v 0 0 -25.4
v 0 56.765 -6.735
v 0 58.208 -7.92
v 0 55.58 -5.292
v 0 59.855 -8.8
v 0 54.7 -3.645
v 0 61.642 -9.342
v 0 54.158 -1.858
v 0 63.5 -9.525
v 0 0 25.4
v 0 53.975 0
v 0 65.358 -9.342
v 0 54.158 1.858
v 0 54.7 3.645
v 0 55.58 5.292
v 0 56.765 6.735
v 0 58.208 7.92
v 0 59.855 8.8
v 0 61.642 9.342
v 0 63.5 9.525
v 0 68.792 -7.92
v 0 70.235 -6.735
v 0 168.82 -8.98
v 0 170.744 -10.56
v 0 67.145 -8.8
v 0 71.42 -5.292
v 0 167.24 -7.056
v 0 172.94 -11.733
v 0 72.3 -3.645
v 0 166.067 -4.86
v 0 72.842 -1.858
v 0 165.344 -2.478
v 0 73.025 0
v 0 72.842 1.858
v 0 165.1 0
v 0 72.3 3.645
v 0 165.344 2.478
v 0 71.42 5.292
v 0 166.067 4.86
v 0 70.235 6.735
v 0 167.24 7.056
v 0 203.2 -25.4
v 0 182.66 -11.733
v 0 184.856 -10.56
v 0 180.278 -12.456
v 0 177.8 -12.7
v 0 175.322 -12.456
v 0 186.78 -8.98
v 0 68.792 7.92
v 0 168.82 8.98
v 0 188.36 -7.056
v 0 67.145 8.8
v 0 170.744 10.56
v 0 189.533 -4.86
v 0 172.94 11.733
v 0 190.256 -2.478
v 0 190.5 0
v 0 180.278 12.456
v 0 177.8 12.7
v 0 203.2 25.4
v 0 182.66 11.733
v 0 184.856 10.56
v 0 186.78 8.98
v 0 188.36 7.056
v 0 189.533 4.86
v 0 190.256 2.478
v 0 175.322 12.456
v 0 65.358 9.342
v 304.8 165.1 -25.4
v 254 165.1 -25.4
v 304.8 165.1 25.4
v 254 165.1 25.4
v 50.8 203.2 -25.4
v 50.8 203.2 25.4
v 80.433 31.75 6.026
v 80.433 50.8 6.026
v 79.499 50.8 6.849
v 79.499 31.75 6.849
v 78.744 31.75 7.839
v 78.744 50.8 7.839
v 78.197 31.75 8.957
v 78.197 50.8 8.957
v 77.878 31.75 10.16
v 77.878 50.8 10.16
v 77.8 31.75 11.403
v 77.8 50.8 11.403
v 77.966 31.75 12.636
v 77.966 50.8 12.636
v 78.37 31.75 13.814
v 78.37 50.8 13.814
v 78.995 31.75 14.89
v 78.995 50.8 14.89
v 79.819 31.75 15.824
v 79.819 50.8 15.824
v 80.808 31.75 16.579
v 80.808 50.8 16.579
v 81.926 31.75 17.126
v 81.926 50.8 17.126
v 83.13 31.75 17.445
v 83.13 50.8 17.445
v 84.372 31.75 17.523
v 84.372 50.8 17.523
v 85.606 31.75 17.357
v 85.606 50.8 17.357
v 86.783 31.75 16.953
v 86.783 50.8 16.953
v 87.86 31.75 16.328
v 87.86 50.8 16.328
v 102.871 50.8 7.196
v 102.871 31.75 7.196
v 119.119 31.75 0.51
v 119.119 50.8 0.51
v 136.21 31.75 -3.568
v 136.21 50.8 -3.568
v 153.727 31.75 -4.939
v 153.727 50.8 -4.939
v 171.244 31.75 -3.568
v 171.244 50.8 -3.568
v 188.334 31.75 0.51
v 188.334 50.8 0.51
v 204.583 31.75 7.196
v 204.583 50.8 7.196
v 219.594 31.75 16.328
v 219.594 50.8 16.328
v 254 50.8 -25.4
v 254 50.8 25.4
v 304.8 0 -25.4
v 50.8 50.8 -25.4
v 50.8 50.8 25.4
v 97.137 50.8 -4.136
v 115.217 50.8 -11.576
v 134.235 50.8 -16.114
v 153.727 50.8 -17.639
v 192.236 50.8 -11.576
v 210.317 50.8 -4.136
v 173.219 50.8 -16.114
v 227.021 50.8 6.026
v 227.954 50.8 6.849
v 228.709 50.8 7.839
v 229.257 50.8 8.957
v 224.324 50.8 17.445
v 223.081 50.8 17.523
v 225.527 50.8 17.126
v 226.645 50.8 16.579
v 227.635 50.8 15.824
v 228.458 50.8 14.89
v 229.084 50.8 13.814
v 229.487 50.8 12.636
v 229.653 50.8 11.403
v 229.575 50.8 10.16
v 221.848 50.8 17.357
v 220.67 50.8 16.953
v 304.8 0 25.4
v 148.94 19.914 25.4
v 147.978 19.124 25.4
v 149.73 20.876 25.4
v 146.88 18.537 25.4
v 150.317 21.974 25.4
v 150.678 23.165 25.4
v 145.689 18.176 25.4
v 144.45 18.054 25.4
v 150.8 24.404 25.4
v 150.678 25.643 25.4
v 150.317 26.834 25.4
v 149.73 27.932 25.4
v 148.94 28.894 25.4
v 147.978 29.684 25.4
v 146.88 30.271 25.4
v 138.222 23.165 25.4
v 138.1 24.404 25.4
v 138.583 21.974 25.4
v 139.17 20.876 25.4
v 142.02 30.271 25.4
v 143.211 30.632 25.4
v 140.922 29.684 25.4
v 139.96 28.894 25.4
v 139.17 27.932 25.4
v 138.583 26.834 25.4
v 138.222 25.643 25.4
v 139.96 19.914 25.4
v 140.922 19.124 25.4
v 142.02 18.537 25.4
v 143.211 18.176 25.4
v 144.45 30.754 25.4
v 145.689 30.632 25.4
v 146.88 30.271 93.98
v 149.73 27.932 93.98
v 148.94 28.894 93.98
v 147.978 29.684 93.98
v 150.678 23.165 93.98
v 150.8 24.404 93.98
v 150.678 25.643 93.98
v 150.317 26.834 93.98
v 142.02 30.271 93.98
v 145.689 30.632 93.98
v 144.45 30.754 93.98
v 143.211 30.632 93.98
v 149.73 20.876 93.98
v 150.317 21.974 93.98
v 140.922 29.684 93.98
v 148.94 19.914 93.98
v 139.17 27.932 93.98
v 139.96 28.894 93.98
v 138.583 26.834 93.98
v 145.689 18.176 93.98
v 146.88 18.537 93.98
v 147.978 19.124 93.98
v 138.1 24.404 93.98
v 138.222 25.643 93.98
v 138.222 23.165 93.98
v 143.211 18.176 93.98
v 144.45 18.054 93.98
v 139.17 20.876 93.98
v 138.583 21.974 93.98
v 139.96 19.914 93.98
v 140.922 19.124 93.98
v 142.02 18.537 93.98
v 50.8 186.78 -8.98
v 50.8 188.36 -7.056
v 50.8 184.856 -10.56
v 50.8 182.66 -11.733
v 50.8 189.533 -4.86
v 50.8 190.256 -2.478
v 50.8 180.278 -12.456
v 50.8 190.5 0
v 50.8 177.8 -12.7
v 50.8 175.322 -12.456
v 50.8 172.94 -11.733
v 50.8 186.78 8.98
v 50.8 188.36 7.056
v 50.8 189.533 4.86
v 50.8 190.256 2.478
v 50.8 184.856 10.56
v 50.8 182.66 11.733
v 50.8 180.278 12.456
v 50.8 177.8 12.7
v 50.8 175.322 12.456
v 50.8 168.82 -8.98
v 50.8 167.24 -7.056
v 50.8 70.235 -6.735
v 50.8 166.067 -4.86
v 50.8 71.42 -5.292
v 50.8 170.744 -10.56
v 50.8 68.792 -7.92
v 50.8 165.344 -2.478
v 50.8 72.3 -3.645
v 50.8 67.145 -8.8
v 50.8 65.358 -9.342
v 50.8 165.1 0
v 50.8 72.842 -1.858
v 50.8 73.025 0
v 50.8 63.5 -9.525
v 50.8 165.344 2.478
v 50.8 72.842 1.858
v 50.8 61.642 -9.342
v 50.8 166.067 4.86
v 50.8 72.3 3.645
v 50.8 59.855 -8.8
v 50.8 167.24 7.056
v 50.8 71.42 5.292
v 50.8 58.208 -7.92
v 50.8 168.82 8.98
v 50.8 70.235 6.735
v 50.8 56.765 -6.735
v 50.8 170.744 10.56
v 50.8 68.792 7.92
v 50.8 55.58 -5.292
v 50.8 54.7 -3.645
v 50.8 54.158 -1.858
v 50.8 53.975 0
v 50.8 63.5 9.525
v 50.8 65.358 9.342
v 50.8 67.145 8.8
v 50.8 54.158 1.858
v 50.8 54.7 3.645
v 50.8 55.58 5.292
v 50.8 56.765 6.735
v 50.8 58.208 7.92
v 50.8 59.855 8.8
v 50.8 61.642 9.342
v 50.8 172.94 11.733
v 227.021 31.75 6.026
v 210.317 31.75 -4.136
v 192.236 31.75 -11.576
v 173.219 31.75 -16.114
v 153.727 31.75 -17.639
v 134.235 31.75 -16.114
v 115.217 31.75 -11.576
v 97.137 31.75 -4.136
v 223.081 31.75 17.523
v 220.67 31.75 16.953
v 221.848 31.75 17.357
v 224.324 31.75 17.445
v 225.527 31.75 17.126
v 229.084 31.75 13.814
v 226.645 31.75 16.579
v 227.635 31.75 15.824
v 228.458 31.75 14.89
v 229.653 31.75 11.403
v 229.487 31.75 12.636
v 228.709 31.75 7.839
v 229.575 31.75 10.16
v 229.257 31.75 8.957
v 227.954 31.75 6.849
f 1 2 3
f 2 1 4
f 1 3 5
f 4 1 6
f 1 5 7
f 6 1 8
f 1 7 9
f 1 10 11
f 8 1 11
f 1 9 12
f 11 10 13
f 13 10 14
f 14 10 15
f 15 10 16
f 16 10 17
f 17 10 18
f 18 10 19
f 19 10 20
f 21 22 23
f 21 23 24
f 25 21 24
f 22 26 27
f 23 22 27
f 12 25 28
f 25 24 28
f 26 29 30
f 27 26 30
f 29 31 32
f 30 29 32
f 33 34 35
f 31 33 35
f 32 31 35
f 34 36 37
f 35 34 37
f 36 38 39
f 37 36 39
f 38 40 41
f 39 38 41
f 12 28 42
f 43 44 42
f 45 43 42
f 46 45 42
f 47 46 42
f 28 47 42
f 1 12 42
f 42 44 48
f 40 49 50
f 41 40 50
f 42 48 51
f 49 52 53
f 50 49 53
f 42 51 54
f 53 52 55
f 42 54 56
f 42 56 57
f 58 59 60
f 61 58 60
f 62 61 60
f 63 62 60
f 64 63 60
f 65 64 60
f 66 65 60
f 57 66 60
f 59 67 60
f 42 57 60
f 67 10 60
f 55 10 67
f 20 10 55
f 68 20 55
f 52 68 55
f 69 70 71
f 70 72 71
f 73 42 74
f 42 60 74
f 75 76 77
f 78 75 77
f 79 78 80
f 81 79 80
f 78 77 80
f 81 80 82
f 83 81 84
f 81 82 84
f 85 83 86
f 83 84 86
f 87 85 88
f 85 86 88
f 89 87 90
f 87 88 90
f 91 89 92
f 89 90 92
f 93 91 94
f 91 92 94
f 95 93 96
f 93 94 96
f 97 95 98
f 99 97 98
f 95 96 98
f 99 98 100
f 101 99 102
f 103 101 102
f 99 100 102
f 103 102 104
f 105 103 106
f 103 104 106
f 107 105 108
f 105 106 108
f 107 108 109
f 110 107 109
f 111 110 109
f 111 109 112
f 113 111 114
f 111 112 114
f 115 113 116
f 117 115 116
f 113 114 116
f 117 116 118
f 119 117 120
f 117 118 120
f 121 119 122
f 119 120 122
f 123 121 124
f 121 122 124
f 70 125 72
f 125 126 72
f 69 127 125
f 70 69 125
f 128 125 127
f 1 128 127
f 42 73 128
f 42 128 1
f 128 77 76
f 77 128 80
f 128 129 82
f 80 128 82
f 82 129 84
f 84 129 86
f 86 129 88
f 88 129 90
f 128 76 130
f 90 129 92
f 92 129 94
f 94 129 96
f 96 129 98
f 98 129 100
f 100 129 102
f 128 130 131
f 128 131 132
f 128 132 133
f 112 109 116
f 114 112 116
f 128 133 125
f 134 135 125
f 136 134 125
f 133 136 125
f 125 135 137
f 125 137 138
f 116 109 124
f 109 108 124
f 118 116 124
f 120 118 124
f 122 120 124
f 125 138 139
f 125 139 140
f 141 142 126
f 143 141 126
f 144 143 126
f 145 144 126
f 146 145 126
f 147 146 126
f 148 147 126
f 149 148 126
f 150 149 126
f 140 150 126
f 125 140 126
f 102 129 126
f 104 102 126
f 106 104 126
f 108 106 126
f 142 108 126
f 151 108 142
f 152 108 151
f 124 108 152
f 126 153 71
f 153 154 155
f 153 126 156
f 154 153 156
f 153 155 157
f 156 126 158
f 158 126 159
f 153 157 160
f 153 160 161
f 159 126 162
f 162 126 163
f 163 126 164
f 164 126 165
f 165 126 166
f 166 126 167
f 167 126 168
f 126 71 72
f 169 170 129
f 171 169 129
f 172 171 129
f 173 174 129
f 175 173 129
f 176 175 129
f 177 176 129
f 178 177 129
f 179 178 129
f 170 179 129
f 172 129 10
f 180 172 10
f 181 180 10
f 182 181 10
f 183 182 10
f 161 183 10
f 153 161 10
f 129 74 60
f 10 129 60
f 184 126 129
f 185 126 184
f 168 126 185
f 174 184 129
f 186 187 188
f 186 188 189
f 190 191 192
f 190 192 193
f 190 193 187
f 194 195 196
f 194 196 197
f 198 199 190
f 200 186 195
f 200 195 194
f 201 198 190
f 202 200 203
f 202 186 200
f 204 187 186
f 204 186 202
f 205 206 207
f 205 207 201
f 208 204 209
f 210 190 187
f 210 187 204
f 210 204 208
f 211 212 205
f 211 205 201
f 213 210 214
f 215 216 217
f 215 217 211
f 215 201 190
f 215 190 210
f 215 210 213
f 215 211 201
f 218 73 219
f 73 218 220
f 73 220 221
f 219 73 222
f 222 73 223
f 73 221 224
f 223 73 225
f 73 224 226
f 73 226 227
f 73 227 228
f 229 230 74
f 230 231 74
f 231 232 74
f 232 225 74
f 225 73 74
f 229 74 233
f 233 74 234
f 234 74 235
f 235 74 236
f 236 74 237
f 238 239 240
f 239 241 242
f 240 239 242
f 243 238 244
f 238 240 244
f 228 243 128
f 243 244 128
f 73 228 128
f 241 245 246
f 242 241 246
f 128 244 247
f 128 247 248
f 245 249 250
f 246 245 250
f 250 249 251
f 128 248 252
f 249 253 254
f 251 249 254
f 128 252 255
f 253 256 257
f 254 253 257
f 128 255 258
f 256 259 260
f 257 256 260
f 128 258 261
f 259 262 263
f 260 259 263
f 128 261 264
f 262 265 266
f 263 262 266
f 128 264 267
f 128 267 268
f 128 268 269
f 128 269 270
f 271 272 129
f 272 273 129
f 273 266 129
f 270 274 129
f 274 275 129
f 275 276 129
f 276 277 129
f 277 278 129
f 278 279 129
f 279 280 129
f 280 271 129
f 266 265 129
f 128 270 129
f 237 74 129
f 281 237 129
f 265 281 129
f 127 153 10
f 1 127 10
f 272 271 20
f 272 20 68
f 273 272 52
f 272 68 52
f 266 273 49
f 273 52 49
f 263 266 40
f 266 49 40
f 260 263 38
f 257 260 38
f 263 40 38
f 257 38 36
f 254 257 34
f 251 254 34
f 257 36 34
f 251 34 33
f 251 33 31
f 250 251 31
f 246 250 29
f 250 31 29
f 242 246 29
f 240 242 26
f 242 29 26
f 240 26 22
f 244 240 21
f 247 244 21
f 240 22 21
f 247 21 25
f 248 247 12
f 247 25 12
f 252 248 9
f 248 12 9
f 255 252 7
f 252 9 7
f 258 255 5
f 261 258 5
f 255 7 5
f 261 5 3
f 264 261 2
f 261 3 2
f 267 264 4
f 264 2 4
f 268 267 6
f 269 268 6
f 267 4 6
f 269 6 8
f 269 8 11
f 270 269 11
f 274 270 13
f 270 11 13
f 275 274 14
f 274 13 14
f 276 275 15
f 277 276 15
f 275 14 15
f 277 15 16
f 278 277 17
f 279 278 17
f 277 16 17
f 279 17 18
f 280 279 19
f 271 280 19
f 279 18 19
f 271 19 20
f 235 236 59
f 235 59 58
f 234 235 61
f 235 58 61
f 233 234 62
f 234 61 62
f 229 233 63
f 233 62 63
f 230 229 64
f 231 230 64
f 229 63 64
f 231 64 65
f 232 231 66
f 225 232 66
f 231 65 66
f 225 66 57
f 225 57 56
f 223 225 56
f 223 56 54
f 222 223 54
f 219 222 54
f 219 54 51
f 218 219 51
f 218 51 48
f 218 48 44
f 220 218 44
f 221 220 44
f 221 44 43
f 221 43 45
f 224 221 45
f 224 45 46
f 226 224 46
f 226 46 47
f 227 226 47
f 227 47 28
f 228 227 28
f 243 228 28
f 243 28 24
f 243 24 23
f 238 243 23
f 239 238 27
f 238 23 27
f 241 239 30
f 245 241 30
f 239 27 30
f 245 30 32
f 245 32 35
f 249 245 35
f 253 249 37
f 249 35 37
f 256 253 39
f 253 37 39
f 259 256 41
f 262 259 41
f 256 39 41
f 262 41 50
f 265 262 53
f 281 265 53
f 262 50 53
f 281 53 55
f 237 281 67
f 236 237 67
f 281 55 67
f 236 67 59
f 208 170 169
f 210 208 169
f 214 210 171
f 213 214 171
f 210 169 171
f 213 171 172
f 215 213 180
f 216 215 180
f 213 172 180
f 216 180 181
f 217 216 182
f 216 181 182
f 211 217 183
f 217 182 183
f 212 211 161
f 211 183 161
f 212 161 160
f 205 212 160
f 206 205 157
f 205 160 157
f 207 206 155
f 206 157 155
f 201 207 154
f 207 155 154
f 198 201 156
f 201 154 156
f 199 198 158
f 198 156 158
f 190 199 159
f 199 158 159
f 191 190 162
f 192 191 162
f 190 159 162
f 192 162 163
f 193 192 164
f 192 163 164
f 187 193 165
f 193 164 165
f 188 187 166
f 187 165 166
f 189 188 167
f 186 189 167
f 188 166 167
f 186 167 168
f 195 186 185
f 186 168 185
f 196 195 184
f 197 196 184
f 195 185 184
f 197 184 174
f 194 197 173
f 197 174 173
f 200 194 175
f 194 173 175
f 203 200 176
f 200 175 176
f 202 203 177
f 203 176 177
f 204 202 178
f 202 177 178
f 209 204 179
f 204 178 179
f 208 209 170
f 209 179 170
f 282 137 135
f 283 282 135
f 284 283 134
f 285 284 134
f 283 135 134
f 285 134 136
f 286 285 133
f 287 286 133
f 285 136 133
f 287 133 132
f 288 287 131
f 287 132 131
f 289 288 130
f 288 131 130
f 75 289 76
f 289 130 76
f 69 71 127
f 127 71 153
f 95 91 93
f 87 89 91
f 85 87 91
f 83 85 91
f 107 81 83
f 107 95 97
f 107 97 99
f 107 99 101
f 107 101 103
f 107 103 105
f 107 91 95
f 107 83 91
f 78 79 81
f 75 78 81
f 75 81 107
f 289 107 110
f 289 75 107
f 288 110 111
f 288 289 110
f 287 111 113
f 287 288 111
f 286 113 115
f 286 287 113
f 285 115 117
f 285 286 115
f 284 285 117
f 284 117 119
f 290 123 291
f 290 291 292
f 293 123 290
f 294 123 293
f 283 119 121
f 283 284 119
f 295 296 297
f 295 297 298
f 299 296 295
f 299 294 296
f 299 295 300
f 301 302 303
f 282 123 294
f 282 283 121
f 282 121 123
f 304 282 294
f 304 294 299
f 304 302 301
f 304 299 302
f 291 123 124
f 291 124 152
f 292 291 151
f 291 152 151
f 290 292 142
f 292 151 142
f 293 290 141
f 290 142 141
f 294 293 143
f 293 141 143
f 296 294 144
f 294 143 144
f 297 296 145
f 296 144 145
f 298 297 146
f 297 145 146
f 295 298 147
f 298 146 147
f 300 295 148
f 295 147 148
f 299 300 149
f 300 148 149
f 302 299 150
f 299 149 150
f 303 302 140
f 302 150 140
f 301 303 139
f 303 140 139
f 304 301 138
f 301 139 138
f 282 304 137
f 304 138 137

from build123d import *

# Parameters (mm, degrees)
BOSS_EXTRUDE1_DEPTH = 25.4
CUT_EXTRUDE1_REACH  = 369.204
SKETCH2_R           = 12.7
SKETCH3_R           = 9.525
CUT_EXTRUDE2_DEPTH  = 50.8
SKETCH4_R           = 6.35
BOSS_EXTRUDE2_DEPTH = 68.58
CUT_EXTRUDE3_DEPTH  = 19.05


with BuildPart() as part:
    # Sketch1 → Boss-Extrude1 (new, symmetric)
    with BuildSketch(Plane.XY):
        Polygon((0, 0), (0, 203.2), (50.8, 203.2), (50.8, 50.8), (254, 50.8), (254, 165.1), (304.8, 165.1), (304.8, 0), align=None)
    extrude(amount=BOSS_EXTRUDE1_DEPTH, both=True)

    # Sketch2 → Cut-Extrude1 (cut, up to next)
    with BuildSketch(Plane.ZY, mode=Mode.PRIVATE) as cut_extrude1_sk1:
        with Locations((0, 177.8)):
            Circle(SKETCH2_R)
    cut_extrude1_tool1 = extrude(cut_extrude1_sk1.sketch, amount=-CUT_EXTRUDE1_REACH, mode=Mode.PRIVATE) & part.part
    add(cut_extrude1_tool1.solids().sort_by_distance((0, 177.8, 0))[0], mode=Mode.SUBTRACT)

    # Sketch3 → Cut-Extrude2 (cut)
    with BuildSketch(Plane.ZY):
        with Locations((0, 63.5)):
            Circle(SKETCH3_R)
    extrude(amount=-CUT_EXTRUDE2_DEPTH, mode=Mode.SUBTRACT)

    # Sketch4 → Boss-Extrude2 (add)
    with BuildSketch(Plane.XY.offset(25.4)):
        with Locations(Location((144.449989541, 24.404106045, 0), (0, 0, 180))):
            Circle(SKETCH4_R)
    extrude(amount=BOSS_EXTRUDE2_DEPTH)

    # Sketch5 → Cut-Extrude3 (cut)
    with BuildSketch(Plane(origin=(0, 50.8, 0), x_dir=(1, 0, 0), z_dir=(0, 1, 0))):
        with BuildLine():
            ThreePointArc((227.02055062, -6.025839331), (153.726793571, 17.638579798), (80.433036521, -6.025839331))
            ThreePointArc((80.433036521, -6.025839331), (78.995330638, -14.890262707), (87.859754015, -16.32796859))
            ThreePointArc((87.859754015, -16.32796859), (153.726793571, 4.938579798), (219.593833127, -16.32796859))
            ThreePointArc((219.593833127, -16.32796859), (228.458256503, -14.890262707), (227.02055062, -6.025839331))
        make_face()
    extrude(amount=-CUT_EXTRUDE3_DEPTH, mode=Mode.SUBTRACT)


solid = part.part
